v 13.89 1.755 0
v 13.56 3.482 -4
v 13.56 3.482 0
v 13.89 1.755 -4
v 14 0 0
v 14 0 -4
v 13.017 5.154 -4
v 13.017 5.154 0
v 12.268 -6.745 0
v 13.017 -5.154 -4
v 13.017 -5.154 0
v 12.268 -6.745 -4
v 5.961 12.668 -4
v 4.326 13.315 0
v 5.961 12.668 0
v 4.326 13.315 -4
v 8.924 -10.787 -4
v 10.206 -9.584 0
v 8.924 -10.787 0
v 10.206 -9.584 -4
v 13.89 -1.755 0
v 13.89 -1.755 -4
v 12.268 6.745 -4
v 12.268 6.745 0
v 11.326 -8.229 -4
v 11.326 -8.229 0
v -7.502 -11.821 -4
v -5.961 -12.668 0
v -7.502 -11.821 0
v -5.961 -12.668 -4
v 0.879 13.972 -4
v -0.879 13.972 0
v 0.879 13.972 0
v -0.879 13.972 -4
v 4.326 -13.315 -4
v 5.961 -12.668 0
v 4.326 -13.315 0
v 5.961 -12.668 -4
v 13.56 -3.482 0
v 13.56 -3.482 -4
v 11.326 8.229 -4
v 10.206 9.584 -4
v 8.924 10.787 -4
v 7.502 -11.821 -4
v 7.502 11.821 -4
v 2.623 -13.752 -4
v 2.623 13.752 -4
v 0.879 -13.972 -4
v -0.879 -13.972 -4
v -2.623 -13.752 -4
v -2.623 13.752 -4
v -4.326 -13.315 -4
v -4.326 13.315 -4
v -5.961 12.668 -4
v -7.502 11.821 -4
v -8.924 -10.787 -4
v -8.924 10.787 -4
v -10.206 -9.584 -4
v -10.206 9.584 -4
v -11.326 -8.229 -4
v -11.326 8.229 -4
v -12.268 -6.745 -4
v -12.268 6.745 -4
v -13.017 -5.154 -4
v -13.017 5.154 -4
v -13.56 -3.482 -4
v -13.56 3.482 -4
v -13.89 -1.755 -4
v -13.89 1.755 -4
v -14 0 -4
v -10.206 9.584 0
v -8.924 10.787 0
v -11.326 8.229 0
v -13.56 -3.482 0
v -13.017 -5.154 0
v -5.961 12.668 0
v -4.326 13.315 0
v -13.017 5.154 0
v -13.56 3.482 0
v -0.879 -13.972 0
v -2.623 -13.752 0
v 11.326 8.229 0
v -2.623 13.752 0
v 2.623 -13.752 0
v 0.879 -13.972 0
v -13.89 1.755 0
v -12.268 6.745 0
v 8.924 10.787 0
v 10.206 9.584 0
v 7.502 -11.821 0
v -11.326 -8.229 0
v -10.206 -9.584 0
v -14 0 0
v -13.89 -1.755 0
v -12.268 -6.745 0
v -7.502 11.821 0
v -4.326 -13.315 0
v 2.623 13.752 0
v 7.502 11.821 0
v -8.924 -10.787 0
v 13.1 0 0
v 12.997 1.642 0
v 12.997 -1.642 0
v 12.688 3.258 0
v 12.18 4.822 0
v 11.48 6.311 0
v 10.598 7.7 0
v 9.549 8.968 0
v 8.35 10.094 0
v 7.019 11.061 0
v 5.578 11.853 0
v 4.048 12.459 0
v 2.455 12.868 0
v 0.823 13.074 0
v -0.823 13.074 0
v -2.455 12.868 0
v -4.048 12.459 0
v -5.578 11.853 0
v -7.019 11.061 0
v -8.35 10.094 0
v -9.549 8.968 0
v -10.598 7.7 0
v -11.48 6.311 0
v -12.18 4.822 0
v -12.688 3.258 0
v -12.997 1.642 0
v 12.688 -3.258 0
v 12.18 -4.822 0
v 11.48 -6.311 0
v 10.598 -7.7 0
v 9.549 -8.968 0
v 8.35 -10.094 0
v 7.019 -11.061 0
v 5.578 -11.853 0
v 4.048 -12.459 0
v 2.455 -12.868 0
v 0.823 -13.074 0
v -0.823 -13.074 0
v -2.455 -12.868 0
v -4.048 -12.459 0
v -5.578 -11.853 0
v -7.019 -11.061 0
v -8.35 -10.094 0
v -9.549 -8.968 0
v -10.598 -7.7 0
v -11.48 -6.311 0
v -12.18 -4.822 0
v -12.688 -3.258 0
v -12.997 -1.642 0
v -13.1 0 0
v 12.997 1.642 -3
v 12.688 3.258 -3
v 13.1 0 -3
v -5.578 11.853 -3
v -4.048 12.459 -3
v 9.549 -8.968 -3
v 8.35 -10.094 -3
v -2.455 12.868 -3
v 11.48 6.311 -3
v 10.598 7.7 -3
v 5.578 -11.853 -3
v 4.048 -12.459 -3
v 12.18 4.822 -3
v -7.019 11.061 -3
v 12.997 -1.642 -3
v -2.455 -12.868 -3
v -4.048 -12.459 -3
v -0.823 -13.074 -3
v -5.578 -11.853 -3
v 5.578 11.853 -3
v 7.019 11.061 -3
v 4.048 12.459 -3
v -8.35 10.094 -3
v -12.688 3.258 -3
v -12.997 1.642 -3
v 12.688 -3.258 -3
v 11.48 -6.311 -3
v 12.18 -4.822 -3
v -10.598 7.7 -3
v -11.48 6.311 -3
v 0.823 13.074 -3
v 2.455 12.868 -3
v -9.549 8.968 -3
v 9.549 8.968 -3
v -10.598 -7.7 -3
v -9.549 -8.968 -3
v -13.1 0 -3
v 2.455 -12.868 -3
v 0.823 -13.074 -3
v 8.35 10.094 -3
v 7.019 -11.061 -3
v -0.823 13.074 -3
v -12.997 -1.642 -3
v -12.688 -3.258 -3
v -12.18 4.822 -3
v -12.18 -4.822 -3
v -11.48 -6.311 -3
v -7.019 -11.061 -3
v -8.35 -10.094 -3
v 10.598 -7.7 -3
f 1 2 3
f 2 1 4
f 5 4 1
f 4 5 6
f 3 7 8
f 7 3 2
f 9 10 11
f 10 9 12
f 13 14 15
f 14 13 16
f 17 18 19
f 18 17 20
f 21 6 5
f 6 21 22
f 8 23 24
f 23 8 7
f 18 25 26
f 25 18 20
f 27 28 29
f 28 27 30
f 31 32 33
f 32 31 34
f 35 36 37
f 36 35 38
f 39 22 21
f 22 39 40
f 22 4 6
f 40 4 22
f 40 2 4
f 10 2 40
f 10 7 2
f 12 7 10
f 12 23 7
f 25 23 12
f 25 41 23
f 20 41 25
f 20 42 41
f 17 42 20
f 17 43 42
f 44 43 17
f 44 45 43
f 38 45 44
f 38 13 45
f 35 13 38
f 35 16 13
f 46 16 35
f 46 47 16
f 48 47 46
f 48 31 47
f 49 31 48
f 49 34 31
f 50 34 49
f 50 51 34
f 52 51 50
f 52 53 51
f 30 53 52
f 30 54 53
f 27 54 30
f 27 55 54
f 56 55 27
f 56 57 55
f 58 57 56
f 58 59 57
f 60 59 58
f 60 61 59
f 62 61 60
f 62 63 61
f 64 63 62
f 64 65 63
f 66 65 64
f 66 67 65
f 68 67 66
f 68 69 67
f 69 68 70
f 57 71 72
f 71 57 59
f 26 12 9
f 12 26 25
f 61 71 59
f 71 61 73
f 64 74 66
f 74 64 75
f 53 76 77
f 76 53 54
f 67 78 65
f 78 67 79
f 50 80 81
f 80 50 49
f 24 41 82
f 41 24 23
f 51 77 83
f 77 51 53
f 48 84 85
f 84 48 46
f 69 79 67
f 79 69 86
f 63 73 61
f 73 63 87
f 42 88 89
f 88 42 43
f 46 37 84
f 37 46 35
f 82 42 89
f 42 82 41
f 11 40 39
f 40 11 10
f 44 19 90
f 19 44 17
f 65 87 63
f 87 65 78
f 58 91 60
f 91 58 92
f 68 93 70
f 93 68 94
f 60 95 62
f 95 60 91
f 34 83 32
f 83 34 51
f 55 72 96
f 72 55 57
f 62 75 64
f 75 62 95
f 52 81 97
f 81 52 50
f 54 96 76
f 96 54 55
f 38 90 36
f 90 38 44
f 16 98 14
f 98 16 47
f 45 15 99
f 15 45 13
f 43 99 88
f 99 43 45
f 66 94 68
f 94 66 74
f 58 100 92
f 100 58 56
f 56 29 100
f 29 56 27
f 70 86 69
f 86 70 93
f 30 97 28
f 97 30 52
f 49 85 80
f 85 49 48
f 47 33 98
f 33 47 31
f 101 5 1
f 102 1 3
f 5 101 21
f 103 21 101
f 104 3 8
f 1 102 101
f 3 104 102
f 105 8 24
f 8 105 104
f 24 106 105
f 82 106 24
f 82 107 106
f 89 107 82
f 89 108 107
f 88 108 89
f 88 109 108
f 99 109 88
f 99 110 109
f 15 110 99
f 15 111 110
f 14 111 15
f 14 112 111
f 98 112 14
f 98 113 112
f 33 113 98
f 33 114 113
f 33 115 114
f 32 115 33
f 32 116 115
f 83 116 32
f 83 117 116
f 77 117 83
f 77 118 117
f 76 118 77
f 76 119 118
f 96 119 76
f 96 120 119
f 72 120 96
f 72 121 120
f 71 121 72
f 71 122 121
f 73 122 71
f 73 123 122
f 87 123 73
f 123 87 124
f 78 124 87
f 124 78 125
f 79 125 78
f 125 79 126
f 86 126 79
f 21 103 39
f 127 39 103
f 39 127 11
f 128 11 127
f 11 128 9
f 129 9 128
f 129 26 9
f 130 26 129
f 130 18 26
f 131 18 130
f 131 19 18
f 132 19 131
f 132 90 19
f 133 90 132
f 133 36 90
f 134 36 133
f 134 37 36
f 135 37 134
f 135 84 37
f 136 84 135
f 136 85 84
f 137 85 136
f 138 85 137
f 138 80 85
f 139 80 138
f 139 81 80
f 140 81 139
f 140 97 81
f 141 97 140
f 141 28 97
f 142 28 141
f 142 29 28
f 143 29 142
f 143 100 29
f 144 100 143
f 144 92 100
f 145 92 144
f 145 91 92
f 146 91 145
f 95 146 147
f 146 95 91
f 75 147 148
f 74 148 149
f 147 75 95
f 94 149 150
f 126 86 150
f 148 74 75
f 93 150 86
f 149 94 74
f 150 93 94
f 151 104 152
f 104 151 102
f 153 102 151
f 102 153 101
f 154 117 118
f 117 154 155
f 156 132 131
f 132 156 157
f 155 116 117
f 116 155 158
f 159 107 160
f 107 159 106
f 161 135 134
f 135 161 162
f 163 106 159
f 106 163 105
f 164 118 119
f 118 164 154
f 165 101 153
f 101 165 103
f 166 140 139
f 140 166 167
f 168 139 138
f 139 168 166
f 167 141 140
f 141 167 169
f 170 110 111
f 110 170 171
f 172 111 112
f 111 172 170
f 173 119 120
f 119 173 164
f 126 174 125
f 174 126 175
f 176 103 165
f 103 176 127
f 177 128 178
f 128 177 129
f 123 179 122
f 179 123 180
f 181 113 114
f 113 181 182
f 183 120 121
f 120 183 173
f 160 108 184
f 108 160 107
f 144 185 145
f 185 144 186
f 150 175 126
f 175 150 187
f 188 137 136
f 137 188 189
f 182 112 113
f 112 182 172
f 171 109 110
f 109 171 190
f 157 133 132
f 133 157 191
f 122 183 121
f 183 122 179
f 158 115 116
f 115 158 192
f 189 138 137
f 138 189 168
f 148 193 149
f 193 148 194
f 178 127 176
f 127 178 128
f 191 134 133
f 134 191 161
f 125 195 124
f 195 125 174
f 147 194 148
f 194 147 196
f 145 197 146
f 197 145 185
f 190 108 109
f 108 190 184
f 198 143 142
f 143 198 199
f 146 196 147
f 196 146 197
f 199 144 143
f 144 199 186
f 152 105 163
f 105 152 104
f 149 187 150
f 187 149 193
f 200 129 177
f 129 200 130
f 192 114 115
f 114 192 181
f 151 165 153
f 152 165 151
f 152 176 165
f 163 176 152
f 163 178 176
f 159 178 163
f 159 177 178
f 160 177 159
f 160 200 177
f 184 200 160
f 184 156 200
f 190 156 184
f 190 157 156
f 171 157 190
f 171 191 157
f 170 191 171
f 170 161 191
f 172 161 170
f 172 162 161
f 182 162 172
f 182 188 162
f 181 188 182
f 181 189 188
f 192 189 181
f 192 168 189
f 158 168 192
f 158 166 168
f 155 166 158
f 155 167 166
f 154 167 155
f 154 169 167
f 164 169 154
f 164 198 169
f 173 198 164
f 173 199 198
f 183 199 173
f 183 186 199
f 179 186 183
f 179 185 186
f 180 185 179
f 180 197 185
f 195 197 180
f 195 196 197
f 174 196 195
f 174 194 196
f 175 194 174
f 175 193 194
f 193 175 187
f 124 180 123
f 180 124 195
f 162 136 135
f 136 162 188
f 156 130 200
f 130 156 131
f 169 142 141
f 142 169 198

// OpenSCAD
$fn = 50;


difference() {
	union() {
		translate(v = [0, 0, -4.0000000000]) {
			cylinder(h = 4, r = 14.0000000000);
		}
	}
	union() {
		#translate(v = [0, 0, -3.0000000000]) {
			cylinder(h = 3, r = 13.1000000000);
		}
	}
}
